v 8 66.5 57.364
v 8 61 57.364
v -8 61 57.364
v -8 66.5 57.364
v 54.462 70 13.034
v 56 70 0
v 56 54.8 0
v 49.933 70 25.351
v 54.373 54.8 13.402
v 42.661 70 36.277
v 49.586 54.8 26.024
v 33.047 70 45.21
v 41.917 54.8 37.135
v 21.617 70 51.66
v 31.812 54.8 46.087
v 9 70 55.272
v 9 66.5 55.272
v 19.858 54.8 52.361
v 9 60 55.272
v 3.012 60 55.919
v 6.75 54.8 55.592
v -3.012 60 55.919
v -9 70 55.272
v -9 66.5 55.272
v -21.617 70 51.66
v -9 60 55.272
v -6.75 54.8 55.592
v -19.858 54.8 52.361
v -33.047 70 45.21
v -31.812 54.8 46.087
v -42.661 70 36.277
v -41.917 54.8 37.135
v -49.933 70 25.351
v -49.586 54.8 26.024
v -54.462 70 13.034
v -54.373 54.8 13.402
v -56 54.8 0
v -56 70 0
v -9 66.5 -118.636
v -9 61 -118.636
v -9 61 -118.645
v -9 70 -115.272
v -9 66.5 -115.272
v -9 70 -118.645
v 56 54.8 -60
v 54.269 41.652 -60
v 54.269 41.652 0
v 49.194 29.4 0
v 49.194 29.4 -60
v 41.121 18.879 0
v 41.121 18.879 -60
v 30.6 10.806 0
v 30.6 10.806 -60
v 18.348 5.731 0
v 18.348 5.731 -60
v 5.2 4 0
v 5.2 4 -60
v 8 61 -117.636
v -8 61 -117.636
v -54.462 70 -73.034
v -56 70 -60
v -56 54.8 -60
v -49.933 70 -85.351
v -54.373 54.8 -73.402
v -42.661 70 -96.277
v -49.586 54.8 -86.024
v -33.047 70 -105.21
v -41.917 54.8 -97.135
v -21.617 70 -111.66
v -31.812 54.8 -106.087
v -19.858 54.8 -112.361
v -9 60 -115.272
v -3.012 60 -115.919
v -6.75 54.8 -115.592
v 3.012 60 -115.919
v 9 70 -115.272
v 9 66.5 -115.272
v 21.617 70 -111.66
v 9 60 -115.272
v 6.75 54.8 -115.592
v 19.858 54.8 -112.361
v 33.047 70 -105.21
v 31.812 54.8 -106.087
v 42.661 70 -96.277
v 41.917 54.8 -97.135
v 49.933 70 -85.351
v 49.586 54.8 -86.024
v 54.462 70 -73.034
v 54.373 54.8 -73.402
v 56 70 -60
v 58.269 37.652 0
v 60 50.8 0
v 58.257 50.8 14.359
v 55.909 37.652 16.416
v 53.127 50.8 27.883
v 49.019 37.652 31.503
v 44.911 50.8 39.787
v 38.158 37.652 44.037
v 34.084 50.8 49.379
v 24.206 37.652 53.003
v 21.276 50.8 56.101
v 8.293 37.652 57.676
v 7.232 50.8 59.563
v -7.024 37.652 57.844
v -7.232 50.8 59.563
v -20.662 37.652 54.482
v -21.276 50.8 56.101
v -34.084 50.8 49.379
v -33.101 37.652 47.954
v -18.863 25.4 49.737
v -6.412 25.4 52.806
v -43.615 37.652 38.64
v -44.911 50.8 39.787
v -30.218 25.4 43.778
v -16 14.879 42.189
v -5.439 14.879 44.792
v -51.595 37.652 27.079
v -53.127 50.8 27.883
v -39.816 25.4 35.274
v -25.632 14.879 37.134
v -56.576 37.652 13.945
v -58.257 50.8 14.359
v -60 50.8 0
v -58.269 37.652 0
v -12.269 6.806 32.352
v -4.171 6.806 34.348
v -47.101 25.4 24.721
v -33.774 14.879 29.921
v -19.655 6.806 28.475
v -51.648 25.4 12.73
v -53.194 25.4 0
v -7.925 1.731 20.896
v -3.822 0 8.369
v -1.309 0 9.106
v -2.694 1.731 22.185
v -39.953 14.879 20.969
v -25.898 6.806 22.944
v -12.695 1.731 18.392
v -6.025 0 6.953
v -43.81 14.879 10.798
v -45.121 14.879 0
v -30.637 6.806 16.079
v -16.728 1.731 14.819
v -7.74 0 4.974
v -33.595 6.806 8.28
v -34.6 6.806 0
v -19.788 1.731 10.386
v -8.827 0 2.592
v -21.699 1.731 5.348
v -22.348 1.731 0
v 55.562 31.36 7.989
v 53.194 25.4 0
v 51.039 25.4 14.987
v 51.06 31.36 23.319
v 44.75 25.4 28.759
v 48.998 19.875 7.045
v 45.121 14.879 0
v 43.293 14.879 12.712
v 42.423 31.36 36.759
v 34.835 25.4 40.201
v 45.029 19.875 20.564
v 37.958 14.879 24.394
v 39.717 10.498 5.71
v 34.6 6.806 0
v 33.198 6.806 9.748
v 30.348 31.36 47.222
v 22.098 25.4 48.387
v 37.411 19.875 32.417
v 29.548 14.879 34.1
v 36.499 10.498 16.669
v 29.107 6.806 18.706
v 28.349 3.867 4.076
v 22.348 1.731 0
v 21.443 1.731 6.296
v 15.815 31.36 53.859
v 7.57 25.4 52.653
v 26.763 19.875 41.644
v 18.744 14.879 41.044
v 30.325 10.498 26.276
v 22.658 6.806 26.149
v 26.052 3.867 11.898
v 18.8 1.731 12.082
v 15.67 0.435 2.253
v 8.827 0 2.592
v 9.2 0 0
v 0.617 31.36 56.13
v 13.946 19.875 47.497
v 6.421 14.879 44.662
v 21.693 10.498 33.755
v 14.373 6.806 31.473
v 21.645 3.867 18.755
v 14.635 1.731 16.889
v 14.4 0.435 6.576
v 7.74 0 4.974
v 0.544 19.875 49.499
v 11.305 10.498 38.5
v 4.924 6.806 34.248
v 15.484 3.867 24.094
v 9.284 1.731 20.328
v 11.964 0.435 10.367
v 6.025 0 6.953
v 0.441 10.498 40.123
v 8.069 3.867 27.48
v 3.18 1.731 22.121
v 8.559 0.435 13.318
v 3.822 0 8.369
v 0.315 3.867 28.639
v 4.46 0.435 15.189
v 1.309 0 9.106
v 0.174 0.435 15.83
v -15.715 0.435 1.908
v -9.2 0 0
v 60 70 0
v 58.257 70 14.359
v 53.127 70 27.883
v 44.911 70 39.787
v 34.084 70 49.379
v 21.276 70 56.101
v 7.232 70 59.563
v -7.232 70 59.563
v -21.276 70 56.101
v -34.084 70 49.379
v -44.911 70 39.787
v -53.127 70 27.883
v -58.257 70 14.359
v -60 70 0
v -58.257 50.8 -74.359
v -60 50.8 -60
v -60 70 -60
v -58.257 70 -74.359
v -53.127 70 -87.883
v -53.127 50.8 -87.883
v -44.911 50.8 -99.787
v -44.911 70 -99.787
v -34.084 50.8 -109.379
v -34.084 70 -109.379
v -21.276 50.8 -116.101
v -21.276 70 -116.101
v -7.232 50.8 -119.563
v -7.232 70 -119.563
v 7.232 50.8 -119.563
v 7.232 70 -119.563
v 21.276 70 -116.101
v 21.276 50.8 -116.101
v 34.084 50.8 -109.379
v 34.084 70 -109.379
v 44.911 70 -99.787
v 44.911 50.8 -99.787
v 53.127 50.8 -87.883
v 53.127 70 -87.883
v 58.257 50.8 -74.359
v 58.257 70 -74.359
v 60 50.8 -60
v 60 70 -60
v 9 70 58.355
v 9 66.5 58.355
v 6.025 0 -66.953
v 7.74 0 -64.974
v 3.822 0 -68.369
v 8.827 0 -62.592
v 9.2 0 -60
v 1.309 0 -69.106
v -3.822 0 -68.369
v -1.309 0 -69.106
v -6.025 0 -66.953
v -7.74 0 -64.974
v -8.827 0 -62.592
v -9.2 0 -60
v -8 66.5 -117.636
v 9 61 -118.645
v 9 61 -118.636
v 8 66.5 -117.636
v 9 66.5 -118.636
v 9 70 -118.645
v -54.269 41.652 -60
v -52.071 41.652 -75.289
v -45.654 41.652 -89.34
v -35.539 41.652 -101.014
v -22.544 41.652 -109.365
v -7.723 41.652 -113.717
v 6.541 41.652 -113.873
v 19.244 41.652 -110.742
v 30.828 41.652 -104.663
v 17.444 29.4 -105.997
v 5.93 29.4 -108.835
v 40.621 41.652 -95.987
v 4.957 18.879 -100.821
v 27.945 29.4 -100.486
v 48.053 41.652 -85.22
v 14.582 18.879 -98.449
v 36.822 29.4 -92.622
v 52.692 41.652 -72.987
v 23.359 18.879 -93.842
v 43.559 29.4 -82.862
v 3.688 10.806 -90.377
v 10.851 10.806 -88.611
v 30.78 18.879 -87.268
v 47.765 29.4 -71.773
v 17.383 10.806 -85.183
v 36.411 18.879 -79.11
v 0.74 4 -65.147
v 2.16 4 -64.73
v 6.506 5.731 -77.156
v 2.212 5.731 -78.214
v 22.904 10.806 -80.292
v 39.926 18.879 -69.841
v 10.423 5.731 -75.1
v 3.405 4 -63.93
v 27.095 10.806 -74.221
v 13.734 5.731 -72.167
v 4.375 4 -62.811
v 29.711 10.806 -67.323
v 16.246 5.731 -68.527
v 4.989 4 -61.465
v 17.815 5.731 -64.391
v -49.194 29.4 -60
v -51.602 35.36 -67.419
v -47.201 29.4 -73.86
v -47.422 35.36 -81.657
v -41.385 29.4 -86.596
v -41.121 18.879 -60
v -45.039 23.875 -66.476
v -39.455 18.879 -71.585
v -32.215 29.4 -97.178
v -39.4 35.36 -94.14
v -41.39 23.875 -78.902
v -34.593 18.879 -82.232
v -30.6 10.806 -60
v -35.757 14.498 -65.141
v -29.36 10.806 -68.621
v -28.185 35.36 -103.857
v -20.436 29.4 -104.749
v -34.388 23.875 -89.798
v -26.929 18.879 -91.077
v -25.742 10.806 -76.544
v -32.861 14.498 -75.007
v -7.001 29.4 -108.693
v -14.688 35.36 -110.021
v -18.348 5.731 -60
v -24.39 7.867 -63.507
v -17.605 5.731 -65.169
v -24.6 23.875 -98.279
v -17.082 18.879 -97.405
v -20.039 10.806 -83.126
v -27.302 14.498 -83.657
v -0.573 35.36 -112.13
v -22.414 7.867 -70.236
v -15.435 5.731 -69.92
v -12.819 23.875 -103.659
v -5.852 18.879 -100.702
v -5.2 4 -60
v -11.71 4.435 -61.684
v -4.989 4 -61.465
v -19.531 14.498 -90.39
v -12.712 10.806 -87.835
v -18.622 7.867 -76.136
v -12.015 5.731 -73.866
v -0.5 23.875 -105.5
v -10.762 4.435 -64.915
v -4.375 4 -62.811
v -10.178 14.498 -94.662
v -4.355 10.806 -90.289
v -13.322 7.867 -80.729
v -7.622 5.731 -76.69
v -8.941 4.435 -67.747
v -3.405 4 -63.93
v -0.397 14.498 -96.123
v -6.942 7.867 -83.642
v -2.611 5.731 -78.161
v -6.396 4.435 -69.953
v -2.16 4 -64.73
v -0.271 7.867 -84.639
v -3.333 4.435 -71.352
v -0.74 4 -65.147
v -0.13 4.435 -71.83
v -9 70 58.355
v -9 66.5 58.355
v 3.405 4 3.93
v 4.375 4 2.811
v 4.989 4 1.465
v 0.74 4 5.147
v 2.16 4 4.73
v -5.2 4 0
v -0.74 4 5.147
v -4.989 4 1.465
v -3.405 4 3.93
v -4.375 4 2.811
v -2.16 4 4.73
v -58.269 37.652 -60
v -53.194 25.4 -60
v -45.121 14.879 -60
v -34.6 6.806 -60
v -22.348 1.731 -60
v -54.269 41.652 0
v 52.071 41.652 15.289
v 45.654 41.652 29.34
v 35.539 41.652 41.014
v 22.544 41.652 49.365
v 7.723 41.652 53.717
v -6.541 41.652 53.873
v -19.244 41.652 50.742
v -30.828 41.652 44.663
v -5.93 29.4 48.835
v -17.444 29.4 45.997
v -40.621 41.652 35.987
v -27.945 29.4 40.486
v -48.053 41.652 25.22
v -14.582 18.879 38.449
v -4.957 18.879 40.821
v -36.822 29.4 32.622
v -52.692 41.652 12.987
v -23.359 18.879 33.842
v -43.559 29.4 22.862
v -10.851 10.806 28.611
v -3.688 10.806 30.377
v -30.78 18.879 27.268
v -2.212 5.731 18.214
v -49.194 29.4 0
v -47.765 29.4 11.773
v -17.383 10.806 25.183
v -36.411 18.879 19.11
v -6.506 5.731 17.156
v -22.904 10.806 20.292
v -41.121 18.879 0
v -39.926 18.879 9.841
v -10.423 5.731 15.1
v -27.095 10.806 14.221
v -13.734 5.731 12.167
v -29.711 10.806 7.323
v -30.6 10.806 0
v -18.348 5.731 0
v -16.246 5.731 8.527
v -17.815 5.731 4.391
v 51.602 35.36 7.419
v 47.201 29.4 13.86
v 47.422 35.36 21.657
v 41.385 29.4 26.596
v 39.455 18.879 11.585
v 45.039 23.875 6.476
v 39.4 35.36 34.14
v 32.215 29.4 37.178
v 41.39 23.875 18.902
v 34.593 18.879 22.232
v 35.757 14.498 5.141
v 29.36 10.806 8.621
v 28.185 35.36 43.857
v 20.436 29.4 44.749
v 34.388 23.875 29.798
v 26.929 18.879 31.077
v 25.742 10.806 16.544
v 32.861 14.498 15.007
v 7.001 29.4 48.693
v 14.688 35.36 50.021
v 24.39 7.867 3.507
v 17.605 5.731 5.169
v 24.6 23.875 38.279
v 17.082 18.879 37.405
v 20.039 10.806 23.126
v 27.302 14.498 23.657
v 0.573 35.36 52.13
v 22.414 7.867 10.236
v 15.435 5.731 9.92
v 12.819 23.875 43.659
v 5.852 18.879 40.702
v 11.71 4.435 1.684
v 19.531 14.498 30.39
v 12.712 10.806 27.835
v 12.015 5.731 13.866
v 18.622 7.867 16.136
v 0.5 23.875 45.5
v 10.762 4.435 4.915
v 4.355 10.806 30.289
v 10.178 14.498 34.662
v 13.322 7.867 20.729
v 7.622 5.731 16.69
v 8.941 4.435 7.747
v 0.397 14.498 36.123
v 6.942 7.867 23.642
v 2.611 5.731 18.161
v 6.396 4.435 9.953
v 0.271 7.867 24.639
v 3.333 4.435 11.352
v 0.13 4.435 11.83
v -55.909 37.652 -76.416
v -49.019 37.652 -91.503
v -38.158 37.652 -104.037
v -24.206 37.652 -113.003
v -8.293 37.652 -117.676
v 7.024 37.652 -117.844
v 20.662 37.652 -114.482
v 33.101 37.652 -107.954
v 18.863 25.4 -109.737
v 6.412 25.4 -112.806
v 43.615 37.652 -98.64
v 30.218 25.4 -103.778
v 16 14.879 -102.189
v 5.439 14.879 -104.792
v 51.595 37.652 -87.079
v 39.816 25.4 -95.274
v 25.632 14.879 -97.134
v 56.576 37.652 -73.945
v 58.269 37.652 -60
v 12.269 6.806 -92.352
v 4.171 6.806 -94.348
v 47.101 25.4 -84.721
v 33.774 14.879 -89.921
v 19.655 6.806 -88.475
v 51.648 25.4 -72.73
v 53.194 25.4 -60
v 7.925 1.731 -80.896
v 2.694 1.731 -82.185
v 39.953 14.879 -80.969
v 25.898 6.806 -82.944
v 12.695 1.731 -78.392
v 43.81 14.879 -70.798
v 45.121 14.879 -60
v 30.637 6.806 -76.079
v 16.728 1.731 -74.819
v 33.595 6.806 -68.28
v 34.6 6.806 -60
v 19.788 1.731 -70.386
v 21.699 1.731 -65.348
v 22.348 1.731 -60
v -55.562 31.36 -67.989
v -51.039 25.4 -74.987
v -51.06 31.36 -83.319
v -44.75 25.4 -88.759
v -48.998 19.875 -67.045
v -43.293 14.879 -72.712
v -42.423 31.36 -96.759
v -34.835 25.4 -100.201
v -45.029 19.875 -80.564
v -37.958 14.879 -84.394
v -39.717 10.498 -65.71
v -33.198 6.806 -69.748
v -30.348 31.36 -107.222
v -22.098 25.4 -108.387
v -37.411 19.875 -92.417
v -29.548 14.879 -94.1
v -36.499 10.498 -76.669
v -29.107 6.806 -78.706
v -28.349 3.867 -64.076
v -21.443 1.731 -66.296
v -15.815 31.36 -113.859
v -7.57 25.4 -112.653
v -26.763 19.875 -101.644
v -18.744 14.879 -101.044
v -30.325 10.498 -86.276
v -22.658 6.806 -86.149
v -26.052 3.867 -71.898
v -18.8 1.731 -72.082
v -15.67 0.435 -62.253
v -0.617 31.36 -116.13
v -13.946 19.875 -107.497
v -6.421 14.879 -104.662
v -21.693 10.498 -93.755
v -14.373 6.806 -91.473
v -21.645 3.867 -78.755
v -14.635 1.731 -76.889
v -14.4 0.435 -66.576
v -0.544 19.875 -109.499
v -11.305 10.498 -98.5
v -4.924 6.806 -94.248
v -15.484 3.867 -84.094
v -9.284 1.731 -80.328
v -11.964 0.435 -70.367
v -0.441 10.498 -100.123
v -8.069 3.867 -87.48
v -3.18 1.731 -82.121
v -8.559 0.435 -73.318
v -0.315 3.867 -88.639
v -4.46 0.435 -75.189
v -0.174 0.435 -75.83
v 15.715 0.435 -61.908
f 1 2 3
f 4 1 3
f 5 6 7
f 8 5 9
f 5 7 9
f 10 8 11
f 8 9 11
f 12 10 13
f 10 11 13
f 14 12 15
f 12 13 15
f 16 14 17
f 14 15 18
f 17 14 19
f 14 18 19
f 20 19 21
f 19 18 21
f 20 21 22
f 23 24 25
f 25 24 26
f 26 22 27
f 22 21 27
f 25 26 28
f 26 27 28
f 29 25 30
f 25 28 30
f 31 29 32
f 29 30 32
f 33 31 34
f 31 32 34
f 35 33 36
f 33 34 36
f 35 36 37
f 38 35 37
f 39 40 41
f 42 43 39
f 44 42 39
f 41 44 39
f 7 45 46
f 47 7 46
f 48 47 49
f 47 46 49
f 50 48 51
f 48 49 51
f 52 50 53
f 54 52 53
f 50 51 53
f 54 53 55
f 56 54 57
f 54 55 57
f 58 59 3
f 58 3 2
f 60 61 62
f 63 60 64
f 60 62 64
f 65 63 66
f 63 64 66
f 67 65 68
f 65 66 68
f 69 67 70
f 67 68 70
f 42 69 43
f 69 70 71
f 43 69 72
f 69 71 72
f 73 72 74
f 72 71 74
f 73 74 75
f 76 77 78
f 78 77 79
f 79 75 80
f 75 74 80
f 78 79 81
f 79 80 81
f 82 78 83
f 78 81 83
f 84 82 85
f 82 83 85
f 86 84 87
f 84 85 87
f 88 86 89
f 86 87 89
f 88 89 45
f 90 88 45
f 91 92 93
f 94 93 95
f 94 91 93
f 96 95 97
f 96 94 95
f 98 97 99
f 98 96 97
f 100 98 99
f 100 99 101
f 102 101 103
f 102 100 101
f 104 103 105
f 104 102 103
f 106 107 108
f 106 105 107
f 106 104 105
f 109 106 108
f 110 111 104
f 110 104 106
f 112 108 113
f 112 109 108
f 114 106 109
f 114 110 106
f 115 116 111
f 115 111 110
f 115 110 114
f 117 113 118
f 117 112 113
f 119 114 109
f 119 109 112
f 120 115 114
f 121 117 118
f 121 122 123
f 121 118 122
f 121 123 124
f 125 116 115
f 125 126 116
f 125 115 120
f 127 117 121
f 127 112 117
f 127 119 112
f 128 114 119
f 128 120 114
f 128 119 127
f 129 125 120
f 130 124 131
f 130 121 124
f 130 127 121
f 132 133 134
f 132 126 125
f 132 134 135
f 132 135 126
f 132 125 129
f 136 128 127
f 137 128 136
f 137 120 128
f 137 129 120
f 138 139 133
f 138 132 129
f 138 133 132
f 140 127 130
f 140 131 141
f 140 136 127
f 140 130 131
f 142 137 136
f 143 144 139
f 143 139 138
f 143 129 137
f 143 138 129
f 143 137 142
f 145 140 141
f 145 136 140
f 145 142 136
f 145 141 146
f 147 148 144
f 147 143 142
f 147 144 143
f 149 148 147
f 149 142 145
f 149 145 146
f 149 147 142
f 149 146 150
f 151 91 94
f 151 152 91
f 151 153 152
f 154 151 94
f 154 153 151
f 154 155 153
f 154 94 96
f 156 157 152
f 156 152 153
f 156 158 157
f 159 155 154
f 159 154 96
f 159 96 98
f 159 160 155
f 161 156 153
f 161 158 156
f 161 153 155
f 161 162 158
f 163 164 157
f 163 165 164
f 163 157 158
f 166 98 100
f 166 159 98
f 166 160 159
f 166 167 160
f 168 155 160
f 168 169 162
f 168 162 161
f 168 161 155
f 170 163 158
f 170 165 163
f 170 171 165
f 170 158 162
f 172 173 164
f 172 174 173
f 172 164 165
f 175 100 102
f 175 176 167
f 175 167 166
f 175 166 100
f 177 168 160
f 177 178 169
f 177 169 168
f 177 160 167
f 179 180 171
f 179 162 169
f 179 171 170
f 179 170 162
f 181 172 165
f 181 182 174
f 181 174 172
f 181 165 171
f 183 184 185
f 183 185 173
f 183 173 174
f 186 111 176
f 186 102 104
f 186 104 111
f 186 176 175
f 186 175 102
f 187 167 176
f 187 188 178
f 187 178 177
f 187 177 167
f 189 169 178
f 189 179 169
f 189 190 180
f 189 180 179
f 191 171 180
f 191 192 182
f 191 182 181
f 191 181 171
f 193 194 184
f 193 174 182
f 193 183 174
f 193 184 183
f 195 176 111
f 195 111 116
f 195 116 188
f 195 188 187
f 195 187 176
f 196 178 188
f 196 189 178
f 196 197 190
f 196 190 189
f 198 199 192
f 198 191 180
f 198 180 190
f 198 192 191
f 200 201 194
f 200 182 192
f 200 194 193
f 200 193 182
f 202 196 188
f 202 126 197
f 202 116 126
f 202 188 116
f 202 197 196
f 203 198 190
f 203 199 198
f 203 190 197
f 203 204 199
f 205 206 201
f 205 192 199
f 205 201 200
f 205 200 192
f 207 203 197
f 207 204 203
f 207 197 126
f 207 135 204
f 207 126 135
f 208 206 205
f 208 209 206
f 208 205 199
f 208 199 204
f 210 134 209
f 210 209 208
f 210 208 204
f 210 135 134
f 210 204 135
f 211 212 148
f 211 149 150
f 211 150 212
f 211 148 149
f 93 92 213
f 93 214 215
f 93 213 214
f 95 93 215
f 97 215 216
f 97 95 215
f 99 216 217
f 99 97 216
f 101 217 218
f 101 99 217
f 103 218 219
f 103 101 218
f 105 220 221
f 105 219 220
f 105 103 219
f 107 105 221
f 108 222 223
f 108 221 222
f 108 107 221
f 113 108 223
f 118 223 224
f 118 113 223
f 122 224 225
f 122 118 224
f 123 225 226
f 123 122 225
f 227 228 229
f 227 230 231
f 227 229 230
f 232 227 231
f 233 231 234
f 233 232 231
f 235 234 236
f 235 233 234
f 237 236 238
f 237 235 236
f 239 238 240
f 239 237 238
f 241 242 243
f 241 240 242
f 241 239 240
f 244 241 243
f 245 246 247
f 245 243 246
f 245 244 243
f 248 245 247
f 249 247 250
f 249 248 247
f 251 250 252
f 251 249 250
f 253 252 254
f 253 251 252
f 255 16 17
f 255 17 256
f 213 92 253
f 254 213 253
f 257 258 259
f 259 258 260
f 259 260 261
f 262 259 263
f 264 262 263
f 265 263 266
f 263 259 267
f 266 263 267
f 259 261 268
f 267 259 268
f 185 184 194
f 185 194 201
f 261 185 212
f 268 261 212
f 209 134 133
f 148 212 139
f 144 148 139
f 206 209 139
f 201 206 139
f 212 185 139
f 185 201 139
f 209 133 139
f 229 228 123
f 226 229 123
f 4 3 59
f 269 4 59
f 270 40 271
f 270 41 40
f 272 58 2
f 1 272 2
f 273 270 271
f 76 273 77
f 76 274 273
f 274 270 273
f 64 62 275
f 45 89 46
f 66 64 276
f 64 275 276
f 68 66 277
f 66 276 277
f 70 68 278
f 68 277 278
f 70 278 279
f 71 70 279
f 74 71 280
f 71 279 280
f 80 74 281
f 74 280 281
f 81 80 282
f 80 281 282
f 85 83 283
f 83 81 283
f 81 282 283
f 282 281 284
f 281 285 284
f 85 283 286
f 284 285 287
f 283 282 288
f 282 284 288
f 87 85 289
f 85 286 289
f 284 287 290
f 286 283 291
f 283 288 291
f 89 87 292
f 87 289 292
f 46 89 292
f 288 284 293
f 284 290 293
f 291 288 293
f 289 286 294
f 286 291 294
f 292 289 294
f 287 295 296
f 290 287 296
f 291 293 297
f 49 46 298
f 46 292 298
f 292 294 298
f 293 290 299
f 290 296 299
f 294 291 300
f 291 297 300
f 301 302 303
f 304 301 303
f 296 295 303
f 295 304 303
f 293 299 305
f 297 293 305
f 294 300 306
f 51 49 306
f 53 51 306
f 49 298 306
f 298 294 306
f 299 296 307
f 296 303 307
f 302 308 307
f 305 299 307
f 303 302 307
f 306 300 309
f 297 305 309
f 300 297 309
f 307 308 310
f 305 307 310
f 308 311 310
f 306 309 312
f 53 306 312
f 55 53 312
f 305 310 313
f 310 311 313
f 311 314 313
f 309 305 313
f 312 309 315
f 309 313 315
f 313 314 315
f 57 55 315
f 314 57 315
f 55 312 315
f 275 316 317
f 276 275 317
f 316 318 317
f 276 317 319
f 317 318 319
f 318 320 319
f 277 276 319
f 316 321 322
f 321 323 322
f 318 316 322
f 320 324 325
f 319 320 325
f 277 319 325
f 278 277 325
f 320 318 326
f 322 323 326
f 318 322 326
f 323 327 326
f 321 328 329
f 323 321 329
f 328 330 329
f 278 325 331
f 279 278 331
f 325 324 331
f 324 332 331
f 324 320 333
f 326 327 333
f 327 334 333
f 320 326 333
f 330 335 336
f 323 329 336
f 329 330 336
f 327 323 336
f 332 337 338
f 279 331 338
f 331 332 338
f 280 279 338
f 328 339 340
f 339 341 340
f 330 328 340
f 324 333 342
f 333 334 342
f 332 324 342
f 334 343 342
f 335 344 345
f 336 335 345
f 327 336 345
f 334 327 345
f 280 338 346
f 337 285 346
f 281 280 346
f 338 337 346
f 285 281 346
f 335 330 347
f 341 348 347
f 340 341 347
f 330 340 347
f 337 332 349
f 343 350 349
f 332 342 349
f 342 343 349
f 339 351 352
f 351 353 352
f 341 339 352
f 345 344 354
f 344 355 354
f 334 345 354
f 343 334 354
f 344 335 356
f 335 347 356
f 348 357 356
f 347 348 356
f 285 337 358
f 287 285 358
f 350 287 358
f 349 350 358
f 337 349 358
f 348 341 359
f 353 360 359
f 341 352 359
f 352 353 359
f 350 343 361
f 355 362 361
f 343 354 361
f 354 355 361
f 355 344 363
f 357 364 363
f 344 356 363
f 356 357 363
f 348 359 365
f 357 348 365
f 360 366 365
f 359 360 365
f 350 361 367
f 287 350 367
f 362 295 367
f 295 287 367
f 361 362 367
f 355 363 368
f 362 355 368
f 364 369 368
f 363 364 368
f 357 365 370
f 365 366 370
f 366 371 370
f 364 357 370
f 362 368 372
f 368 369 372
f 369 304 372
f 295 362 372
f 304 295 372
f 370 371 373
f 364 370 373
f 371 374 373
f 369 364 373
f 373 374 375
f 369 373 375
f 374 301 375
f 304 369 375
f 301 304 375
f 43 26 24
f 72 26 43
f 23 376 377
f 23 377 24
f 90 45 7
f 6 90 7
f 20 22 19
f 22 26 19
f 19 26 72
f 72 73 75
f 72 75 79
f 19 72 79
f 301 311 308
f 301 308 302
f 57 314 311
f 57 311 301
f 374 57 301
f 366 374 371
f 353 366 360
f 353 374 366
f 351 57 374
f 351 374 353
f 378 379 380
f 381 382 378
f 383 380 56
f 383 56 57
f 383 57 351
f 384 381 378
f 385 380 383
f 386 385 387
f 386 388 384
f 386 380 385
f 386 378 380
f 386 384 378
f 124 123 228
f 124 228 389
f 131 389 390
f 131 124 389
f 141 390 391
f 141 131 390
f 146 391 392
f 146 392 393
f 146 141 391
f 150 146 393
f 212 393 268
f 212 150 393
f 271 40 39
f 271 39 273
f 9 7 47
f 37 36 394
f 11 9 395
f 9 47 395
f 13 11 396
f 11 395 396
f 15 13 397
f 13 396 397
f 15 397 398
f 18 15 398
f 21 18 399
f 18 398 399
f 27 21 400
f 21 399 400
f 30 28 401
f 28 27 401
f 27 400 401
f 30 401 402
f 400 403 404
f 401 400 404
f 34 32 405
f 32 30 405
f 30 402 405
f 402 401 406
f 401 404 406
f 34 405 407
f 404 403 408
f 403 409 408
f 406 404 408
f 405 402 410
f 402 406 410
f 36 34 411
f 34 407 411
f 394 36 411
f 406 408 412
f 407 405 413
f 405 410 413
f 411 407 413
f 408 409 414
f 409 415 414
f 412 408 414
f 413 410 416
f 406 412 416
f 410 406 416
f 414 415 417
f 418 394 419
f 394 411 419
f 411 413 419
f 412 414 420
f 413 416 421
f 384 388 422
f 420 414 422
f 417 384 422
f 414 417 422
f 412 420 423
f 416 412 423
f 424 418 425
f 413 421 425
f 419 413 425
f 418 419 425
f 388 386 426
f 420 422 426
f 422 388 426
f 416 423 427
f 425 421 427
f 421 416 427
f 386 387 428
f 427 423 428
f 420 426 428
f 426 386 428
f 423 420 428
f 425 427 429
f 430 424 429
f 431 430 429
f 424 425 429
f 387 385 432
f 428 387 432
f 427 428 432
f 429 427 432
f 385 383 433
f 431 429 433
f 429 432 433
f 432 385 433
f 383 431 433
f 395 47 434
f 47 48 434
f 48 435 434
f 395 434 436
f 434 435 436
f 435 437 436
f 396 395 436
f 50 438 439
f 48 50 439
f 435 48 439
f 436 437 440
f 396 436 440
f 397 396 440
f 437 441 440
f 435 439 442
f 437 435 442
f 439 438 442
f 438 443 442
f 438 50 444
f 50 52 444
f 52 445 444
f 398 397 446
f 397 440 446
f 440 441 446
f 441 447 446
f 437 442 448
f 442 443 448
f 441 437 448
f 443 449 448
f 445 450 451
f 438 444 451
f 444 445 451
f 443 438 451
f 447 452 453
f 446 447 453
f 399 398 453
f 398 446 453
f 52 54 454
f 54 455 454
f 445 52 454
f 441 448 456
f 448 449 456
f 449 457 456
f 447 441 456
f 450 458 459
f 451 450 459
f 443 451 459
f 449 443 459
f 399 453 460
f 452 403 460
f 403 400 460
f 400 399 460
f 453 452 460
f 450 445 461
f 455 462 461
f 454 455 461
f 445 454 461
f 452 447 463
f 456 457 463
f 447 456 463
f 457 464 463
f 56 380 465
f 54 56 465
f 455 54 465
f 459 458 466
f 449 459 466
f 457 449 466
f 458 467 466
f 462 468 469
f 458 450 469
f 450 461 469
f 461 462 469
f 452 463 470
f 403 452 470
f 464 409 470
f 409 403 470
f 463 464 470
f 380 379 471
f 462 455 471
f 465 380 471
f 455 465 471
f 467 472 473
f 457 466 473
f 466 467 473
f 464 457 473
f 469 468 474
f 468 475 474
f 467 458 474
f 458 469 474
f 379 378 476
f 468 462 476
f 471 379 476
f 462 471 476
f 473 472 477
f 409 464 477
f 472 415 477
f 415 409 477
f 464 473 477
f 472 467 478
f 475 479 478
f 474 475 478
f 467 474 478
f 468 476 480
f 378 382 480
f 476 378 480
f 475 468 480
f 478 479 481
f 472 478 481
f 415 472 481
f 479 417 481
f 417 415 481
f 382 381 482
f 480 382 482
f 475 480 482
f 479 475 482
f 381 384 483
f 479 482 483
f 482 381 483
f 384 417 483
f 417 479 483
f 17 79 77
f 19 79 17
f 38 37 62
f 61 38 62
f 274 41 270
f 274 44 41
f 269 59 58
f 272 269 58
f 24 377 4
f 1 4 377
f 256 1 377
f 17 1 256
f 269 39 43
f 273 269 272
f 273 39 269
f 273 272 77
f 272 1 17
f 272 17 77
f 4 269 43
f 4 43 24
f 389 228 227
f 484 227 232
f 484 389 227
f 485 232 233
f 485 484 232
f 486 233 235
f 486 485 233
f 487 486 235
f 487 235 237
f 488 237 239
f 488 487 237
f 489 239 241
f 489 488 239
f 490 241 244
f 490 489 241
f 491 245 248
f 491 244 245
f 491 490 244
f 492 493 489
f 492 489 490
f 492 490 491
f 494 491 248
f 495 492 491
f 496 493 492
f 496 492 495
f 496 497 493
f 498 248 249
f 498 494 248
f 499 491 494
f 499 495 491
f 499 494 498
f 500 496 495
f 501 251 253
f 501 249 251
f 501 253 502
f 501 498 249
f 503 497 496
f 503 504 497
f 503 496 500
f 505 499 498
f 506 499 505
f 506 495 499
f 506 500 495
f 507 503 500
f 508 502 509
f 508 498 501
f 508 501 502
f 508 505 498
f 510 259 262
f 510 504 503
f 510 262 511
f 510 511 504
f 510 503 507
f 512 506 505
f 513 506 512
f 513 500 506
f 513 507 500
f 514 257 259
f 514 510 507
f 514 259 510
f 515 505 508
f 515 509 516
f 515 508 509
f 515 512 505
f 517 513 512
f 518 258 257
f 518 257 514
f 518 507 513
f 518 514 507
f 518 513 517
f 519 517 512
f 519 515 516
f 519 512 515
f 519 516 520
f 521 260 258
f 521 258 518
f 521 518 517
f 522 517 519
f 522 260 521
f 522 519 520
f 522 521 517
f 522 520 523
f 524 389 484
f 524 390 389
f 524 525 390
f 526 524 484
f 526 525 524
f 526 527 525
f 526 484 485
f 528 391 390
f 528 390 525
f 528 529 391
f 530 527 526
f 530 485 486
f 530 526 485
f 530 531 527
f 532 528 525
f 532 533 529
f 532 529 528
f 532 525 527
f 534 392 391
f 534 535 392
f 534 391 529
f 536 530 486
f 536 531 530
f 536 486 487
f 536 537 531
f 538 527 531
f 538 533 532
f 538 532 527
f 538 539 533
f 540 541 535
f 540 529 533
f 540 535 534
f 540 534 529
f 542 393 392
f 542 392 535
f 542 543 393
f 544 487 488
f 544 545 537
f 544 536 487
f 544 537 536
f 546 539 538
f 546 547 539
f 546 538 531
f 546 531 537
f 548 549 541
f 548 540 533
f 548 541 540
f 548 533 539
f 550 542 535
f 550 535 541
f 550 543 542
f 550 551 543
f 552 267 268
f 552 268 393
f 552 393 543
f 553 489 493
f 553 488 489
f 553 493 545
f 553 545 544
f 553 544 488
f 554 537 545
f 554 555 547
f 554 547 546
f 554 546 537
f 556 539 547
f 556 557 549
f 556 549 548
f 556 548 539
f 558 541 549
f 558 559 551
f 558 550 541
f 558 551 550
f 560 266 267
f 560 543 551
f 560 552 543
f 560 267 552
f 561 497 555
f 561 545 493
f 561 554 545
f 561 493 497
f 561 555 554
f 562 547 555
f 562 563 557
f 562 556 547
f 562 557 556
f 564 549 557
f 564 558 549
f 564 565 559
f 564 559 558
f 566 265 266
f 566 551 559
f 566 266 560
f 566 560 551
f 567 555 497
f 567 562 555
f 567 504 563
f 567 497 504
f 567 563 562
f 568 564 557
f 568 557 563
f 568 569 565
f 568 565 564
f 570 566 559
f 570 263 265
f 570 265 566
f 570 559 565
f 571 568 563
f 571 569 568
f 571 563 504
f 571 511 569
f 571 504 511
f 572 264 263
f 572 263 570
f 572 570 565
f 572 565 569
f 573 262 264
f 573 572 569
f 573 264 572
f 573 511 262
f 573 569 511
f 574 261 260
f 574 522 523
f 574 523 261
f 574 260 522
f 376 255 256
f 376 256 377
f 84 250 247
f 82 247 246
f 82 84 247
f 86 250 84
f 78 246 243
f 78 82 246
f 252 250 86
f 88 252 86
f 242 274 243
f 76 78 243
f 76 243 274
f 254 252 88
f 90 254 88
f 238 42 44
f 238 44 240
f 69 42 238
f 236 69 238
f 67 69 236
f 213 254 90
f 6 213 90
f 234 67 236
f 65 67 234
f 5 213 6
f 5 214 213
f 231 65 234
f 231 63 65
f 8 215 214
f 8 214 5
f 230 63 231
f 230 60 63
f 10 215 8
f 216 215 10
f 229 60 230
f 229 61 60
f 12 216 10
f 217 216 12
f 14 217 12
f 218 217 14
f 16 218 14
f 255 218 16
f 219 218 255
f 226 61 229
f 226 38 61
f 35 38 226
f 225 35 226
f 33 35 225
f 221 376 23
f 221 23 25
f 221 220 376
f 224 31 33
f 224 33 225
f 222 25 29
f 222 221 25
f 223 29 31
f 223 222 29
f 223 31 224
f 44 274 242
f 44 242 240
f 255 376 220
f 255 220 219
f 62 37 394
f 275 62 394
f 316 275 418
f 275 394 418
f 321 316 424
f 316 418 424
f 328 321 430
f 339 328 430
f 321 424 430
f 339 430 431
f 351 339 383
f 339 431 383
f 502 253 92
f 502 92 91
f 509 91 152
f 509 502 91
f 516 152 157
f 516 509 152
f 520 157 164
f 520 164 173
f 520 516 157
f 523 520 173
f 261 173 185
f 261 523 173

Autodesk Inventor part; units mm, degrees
ref_plane "YZ Plane" through (0, 0, 0) normal (1, 0, 0) x (0, 1, 0)
ref_plane "XZ Plane" through (0, 0, 0) normal (0, 1, 0) x (-1, 0, 0)
ref_plane "XY Plane" through (0, 0, 0) normal (0, 0, 1) x (1, 0, 0)
sketch "Sketch1" plane through (0, 0, 0) normal (0, 1, 0) x (-1, 0, 0)
  line L0 (0, 0) -> (0, -60) construction
  line L1 (-60, 0) -> (-60, -60)
  line L2 (60, -60) -> (60, 0)
  arc A0 (60, 0) -> (-60, 0) centre (0, 0) ccw
  arc A1 (-60, -60) -> (60, -60) centre (0, -60) ccw
  line L3 (56, 0) -> (56, -60)
  arc A2 (-56, -60) -> (56, -60) centre (0, -60) ccw
  line L4 (-56, -60) -> (-56, 0)
  arc A3 (56, 0) -> (-56, 0) centre (0, 0) ccw
  point P0 (0, -30)
  dimension "d0" = 60
  dimension "d1" = 60
  dimension "d4" = 4
extrude "Extrusion2" add sketch "Sketch1" along normal blind 70
extrude "Extrusion3" add sketch "Sketch1" along normal blind 4 contours L3 A2 L4 A3
fillet "Fillet1" radius 50.8 8 edges at (0, 4, 56) (-56, 4, -30) (0, 4, -116) (56, 4, -30) (0, 0, 60) (60, 0, -30) (0, 0, -120) (-60, 0, -30)
sketch "Sketch5" plane through (0, 70, 0) normal (0, 1, 0) x (1, 0, 0)
  line L0 (-9, 118.645) -> (9, 118.645)
  line L1 (9, 118.645) -> (9, -58.355)
  line L2 (9, -58.355) -> (-9, -58.355)
  line L3 (-9, -58.355) -> (-9, 118.645)
  point P0 (0, 0)
  dimension "d11" = 177
  dimension "d12" = 18
  dimension "d13" = 9
extrude "Extrusion4" add sketch "Sketch5" against normal blind 10
extrude "Extrusion5" cut sketch "Sketch5" against normal blind 9
sketch "Sketch6" plane through (0, 61, 0) normal (0, 1, 0) x (1, 0, 0)
  line L0 (-9, 118.6362) -> (9, 118.6362)
  line L1 (9, 118.6362) -> (9, -58.3638)
  line L2 (9, -58.3638) -> (-9, -58.3638)
  line L3 (-9, -58.3638) -> (-9, 118.6362)
  line L4 (-8, 117.6362) -> (8, 117.6362)
  line L5 (8, 117.6362) -> (8, -57.3638)
  line L6 (8, -57.3638) -> (-8, -57.3638)
  line L7 (-8, -57.3638) -> (-8, 117.6362)
  point P0 (0, 0)
  dimension "d19" = 177
  dimension "d20" = 18
  dimension "d21" = 9
  dimension "d22" = 1
extrude "Extrusion6" add sketch "Sketch6" along normal blind 5.5
properties part number "lid"
